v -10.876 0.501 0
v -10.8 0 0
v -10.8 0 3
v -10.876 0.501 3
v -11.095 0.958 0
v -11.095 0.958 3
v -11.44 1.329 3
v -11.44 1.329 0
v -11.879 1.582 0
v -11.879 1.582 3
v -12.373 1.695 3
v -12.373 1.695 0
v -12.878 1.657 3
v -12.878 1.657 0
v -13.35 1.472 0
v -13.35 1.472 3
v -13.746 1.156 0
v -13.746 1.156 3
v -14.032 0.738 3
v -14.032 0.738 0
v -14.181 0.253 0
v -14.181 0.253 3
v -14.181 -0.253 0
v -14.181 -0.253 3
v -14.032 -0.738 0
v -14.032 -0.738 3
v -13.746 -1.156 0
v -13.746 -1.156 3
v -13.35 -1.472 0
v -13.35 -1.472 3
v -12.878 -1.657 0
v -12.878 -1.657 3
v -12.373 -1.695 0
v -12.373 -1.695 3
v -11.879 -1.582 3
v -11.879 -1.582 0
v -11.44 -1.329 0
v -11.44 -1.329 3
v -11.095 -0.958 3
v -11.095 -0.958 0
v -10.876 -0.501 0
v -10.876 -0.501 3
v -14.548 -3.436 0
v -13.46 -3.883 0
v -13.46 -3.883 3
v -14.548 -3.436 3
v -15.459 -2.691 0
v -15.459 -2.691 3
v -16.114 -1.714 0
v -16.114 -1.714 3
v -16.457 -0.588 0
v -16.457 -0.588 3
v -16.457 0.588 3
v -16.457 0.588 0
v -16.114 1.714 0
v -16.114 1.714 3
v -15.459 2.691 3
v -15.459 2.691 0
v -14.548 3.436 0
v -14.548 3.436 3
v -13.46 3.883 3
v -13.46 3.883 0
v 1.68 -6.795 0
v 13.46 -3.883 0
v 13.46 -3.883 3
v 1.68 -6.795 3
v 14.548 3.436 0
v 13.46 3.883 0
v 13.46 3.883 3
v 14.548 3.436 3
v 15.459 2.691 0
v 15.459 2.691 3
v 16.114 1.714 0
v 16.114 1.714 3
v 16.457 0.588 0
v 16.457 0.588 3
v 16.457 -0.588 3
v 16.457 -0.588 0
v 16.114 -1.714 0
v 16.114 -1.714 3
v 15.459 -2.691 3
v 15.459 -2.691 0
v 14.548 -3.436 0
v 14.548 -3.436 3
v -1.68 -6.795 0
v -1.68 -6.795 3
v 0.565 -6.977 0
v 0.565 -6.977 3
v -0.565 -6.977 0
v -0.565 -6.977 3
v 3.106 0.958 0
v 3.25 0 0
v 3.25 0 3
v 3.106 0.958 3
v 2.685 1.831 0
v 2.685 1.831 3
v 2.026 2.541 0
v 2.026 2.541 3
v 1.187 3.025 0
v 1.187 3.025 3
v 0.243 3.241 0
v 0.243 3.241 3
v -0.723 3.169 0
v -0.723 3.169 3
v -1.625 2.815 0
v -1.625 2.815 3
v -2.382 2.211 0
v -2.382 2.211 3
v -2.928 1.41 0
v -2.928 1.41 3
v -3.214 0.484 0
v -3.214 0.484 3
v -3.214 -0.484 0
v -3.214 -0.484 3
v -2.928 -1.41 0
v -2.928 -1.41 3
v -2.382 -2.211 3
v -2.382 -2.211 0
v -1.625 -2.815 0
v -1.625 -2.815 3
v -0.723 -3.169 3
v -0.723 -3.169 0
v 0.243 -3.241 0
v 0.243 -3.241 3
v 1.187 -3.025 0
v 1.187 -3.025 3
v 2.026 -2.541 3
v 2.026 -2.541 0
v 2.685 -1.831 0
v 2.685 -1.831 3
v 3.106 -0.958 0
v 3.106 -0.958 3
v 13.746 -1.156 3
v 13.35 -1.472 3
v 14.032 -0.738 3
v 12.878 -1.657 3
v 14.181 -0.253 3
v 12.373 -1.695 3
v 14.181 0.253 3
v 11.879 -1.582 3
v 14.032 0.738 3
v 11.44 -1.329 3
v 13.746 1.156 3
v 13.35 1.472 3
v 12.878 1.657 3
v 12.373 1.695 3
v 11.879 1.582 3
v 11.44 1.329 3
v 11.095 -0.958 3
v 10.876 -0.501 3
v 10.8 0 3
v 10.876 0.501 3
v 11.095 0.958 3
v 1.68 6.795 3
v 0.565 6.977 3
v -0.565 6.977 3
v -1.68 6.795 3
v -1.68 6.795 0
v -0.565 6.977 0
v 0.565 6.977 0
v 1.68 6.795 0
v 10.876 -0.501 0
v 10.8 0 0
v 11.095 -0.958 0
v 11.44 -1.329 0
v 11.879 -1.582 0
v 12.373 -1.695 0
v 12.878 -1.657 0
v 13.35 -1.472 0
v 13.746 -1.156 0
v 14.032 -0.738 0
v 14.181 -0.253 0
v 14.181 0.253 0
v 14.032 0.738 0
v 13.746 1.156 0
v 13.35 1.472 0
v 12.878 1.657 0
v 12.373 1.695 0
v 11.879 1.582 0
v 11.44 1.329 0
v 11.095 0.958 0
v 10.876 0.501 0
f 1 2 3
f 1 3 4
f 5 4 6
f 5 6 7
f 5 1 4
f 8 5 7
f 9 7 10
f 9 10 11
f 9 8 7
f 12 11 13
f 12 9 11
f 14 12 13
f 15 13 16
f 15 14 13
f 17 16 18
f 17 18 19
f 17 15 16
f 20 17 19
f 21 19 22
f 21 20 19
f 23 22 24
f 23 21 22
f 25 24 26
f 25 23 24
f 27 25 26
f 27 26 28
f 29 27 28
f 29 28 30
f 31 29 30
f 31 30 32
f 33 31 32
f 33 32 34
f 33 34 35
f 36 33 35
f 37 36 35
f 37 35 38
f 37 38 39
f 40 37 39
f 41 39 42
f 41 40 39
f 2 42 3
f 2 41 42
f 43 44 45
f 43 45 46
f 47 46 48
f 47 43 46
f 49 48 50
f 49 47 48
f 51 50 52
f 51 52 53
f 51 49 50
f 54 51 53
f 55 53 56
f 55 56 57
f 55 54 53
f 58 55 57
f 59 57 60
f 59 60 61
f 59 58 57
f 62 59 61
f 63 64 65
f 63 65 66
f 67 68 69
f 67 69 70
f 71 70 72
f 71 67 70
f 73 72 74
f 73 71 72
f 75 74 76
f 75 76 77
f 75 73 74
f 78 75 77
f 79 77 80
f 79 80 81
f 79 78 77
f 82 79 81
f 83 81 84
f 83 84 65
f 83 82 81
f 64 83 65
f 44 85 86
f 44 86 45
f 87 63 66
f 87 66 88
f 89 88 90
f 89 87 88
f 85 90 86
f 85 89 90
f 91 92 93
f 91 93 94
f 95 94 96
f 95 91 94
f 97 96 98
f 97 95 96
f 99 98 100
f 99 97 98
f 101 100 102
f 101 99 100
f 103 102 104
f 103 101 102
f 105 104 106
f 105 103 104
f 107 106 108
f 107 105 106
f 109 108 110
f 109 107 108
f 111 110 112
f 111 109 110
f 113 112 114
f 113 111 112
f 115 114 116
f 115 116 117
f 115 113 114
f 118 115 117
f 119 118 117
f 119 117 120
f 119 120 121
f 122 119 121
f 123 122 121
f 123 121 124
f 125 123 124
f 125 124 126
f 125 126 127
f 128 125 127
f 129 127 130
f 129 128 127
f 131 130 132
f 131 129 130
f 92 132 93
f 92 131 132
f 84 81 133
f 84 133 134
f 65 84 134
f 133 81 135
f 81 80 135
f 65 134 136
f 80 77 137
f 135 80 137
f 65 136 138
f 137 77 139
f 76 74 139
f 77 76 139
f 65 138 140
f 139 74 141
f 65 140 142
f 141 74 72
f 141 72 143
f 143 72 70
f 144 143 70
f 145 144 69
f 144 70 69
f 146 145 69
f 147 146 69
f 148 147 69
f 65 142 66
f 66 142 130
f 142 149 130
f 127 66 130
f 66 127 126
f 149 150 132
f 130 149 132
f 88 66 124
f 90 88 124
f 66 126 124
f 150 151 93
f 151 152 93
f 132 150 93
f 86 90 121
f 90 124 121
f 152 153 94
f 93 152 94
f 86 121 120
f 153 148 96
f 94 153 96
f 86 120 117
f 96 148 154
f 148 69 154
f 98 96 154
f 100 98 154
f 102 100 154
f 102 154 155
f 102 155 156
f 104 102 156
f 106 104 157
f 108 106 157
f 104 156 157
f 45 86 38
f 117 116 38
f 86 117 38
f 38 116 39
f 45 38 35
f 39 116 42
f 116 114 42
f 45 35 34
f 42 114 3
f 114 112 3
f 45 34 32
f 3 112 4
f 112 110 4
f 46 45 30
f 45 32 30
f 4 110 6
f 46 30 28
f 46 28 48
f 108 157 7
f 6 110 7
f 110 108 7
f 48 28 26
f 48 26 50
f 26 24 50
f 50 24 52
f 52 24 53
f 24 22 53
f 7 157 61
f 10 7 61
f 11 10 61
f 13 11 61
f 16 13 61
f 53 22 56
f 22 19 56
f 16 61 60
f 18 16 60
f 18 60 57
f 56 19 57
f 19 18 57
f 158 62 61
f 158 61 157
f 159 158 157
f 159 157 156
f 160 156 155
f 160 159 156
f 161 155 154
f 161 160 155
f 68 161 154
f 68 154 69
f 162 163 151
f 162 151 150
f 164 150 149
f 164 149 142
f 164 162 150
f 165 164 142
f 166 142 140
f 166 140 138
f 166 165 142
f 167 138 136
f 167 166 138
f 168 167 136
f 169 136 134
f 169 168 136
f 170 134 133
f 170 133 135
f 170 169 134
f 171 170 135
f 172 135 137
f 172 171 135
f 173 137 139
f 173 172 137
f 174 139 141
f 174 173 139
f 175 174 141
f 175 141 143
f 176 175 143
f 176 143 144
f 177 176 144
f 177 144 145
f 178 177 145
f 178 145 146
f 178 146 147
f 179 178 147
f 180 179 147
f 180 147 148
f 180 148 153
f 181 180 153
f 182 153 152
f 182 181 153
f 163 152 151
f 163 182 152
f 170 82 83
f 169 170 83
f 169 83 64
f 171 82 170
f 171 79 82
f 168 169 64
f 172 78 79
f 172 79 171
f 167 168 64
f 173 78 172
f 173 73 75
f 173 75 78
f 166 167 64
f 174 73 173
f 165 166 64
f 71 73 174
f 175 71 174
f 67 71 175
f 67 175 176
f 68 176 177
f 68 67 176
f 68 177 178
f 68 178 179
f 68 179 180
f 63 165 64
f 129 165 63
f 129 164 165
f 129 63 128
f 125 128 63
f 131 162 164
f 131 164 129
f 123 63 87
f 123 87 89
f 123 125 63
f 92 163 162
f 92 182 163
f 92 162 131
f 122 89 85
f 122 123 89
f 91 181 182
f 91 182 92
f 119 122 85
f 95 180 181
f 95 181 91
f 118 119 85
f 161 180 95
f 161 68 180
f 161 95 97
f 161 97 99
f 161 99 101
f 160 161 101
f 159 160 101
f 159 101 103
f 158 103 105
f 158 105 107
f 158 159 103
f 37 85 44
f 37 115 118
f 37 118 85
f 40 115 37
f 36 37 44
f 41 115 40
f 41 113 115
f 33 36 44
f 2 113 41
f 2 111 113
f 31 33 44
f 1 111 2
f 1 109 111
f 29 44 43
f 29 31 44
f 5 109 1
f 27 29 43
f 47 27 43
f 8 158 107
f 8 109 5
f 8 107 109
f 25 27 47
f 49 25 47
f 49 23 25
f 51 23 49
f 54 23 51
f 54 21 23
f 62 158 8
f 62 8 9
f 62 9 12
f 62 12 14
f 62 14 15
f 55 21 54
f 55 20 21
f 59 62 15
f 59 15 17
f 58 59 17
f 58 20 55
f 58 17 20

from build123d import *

# Parameters (mm, degrees)
SKETCH_1_R      = 1.7
SKETCH_1_R_2    = 3.25
EXTRUDE_1_DEPTH = 3


with BuildPart() as part:
    # 草图1 → 凸台-拉伸1 (new body)
    with BuildSketch(Plane.XY):
        with BuildLine():
            Line((-13.46, 3.883091552), (-1.68, 6.795410216))
            ThreePointArc((-1.68, 6.795410216), (0, 7), (1.68, 6.795410216))
            Line((1.68, 6.795410216), (13.46, 3.883091552))
            ThreePointArc((13.46, 3.883091552), (16.5, 0), (13.46, -3.883091552))
            Line((13.46, -3.883091552), (1.68, -6.795410216))
            ThreePointArc((1.68, -6.795410216), (0, -7), (-1.68, -6.795410216))
            Line((-1.68, -6.795410216), (-13.46, -3.883091552))
            ThreePointArc((-13.46, -3.883091552), (-16.5, 0), (-13.46, 3.883091552))
        make_face()
        with Locations((-12.5, 0)):
            Circle(SKETCH_1_R, mode=Mode.SUBTRACT)
        Circle(SKETCH_1_R_2, mode=Mode.SUBTRACT)
        with Locations(Location((12.5, 0, 0), (0, 0, 180))):
            Circle(SKETCH_1_R, mode=Mode.SUBTRACT)
    extrude(amount=EXTRUDE_1_DEPTH)


solid = part.part
